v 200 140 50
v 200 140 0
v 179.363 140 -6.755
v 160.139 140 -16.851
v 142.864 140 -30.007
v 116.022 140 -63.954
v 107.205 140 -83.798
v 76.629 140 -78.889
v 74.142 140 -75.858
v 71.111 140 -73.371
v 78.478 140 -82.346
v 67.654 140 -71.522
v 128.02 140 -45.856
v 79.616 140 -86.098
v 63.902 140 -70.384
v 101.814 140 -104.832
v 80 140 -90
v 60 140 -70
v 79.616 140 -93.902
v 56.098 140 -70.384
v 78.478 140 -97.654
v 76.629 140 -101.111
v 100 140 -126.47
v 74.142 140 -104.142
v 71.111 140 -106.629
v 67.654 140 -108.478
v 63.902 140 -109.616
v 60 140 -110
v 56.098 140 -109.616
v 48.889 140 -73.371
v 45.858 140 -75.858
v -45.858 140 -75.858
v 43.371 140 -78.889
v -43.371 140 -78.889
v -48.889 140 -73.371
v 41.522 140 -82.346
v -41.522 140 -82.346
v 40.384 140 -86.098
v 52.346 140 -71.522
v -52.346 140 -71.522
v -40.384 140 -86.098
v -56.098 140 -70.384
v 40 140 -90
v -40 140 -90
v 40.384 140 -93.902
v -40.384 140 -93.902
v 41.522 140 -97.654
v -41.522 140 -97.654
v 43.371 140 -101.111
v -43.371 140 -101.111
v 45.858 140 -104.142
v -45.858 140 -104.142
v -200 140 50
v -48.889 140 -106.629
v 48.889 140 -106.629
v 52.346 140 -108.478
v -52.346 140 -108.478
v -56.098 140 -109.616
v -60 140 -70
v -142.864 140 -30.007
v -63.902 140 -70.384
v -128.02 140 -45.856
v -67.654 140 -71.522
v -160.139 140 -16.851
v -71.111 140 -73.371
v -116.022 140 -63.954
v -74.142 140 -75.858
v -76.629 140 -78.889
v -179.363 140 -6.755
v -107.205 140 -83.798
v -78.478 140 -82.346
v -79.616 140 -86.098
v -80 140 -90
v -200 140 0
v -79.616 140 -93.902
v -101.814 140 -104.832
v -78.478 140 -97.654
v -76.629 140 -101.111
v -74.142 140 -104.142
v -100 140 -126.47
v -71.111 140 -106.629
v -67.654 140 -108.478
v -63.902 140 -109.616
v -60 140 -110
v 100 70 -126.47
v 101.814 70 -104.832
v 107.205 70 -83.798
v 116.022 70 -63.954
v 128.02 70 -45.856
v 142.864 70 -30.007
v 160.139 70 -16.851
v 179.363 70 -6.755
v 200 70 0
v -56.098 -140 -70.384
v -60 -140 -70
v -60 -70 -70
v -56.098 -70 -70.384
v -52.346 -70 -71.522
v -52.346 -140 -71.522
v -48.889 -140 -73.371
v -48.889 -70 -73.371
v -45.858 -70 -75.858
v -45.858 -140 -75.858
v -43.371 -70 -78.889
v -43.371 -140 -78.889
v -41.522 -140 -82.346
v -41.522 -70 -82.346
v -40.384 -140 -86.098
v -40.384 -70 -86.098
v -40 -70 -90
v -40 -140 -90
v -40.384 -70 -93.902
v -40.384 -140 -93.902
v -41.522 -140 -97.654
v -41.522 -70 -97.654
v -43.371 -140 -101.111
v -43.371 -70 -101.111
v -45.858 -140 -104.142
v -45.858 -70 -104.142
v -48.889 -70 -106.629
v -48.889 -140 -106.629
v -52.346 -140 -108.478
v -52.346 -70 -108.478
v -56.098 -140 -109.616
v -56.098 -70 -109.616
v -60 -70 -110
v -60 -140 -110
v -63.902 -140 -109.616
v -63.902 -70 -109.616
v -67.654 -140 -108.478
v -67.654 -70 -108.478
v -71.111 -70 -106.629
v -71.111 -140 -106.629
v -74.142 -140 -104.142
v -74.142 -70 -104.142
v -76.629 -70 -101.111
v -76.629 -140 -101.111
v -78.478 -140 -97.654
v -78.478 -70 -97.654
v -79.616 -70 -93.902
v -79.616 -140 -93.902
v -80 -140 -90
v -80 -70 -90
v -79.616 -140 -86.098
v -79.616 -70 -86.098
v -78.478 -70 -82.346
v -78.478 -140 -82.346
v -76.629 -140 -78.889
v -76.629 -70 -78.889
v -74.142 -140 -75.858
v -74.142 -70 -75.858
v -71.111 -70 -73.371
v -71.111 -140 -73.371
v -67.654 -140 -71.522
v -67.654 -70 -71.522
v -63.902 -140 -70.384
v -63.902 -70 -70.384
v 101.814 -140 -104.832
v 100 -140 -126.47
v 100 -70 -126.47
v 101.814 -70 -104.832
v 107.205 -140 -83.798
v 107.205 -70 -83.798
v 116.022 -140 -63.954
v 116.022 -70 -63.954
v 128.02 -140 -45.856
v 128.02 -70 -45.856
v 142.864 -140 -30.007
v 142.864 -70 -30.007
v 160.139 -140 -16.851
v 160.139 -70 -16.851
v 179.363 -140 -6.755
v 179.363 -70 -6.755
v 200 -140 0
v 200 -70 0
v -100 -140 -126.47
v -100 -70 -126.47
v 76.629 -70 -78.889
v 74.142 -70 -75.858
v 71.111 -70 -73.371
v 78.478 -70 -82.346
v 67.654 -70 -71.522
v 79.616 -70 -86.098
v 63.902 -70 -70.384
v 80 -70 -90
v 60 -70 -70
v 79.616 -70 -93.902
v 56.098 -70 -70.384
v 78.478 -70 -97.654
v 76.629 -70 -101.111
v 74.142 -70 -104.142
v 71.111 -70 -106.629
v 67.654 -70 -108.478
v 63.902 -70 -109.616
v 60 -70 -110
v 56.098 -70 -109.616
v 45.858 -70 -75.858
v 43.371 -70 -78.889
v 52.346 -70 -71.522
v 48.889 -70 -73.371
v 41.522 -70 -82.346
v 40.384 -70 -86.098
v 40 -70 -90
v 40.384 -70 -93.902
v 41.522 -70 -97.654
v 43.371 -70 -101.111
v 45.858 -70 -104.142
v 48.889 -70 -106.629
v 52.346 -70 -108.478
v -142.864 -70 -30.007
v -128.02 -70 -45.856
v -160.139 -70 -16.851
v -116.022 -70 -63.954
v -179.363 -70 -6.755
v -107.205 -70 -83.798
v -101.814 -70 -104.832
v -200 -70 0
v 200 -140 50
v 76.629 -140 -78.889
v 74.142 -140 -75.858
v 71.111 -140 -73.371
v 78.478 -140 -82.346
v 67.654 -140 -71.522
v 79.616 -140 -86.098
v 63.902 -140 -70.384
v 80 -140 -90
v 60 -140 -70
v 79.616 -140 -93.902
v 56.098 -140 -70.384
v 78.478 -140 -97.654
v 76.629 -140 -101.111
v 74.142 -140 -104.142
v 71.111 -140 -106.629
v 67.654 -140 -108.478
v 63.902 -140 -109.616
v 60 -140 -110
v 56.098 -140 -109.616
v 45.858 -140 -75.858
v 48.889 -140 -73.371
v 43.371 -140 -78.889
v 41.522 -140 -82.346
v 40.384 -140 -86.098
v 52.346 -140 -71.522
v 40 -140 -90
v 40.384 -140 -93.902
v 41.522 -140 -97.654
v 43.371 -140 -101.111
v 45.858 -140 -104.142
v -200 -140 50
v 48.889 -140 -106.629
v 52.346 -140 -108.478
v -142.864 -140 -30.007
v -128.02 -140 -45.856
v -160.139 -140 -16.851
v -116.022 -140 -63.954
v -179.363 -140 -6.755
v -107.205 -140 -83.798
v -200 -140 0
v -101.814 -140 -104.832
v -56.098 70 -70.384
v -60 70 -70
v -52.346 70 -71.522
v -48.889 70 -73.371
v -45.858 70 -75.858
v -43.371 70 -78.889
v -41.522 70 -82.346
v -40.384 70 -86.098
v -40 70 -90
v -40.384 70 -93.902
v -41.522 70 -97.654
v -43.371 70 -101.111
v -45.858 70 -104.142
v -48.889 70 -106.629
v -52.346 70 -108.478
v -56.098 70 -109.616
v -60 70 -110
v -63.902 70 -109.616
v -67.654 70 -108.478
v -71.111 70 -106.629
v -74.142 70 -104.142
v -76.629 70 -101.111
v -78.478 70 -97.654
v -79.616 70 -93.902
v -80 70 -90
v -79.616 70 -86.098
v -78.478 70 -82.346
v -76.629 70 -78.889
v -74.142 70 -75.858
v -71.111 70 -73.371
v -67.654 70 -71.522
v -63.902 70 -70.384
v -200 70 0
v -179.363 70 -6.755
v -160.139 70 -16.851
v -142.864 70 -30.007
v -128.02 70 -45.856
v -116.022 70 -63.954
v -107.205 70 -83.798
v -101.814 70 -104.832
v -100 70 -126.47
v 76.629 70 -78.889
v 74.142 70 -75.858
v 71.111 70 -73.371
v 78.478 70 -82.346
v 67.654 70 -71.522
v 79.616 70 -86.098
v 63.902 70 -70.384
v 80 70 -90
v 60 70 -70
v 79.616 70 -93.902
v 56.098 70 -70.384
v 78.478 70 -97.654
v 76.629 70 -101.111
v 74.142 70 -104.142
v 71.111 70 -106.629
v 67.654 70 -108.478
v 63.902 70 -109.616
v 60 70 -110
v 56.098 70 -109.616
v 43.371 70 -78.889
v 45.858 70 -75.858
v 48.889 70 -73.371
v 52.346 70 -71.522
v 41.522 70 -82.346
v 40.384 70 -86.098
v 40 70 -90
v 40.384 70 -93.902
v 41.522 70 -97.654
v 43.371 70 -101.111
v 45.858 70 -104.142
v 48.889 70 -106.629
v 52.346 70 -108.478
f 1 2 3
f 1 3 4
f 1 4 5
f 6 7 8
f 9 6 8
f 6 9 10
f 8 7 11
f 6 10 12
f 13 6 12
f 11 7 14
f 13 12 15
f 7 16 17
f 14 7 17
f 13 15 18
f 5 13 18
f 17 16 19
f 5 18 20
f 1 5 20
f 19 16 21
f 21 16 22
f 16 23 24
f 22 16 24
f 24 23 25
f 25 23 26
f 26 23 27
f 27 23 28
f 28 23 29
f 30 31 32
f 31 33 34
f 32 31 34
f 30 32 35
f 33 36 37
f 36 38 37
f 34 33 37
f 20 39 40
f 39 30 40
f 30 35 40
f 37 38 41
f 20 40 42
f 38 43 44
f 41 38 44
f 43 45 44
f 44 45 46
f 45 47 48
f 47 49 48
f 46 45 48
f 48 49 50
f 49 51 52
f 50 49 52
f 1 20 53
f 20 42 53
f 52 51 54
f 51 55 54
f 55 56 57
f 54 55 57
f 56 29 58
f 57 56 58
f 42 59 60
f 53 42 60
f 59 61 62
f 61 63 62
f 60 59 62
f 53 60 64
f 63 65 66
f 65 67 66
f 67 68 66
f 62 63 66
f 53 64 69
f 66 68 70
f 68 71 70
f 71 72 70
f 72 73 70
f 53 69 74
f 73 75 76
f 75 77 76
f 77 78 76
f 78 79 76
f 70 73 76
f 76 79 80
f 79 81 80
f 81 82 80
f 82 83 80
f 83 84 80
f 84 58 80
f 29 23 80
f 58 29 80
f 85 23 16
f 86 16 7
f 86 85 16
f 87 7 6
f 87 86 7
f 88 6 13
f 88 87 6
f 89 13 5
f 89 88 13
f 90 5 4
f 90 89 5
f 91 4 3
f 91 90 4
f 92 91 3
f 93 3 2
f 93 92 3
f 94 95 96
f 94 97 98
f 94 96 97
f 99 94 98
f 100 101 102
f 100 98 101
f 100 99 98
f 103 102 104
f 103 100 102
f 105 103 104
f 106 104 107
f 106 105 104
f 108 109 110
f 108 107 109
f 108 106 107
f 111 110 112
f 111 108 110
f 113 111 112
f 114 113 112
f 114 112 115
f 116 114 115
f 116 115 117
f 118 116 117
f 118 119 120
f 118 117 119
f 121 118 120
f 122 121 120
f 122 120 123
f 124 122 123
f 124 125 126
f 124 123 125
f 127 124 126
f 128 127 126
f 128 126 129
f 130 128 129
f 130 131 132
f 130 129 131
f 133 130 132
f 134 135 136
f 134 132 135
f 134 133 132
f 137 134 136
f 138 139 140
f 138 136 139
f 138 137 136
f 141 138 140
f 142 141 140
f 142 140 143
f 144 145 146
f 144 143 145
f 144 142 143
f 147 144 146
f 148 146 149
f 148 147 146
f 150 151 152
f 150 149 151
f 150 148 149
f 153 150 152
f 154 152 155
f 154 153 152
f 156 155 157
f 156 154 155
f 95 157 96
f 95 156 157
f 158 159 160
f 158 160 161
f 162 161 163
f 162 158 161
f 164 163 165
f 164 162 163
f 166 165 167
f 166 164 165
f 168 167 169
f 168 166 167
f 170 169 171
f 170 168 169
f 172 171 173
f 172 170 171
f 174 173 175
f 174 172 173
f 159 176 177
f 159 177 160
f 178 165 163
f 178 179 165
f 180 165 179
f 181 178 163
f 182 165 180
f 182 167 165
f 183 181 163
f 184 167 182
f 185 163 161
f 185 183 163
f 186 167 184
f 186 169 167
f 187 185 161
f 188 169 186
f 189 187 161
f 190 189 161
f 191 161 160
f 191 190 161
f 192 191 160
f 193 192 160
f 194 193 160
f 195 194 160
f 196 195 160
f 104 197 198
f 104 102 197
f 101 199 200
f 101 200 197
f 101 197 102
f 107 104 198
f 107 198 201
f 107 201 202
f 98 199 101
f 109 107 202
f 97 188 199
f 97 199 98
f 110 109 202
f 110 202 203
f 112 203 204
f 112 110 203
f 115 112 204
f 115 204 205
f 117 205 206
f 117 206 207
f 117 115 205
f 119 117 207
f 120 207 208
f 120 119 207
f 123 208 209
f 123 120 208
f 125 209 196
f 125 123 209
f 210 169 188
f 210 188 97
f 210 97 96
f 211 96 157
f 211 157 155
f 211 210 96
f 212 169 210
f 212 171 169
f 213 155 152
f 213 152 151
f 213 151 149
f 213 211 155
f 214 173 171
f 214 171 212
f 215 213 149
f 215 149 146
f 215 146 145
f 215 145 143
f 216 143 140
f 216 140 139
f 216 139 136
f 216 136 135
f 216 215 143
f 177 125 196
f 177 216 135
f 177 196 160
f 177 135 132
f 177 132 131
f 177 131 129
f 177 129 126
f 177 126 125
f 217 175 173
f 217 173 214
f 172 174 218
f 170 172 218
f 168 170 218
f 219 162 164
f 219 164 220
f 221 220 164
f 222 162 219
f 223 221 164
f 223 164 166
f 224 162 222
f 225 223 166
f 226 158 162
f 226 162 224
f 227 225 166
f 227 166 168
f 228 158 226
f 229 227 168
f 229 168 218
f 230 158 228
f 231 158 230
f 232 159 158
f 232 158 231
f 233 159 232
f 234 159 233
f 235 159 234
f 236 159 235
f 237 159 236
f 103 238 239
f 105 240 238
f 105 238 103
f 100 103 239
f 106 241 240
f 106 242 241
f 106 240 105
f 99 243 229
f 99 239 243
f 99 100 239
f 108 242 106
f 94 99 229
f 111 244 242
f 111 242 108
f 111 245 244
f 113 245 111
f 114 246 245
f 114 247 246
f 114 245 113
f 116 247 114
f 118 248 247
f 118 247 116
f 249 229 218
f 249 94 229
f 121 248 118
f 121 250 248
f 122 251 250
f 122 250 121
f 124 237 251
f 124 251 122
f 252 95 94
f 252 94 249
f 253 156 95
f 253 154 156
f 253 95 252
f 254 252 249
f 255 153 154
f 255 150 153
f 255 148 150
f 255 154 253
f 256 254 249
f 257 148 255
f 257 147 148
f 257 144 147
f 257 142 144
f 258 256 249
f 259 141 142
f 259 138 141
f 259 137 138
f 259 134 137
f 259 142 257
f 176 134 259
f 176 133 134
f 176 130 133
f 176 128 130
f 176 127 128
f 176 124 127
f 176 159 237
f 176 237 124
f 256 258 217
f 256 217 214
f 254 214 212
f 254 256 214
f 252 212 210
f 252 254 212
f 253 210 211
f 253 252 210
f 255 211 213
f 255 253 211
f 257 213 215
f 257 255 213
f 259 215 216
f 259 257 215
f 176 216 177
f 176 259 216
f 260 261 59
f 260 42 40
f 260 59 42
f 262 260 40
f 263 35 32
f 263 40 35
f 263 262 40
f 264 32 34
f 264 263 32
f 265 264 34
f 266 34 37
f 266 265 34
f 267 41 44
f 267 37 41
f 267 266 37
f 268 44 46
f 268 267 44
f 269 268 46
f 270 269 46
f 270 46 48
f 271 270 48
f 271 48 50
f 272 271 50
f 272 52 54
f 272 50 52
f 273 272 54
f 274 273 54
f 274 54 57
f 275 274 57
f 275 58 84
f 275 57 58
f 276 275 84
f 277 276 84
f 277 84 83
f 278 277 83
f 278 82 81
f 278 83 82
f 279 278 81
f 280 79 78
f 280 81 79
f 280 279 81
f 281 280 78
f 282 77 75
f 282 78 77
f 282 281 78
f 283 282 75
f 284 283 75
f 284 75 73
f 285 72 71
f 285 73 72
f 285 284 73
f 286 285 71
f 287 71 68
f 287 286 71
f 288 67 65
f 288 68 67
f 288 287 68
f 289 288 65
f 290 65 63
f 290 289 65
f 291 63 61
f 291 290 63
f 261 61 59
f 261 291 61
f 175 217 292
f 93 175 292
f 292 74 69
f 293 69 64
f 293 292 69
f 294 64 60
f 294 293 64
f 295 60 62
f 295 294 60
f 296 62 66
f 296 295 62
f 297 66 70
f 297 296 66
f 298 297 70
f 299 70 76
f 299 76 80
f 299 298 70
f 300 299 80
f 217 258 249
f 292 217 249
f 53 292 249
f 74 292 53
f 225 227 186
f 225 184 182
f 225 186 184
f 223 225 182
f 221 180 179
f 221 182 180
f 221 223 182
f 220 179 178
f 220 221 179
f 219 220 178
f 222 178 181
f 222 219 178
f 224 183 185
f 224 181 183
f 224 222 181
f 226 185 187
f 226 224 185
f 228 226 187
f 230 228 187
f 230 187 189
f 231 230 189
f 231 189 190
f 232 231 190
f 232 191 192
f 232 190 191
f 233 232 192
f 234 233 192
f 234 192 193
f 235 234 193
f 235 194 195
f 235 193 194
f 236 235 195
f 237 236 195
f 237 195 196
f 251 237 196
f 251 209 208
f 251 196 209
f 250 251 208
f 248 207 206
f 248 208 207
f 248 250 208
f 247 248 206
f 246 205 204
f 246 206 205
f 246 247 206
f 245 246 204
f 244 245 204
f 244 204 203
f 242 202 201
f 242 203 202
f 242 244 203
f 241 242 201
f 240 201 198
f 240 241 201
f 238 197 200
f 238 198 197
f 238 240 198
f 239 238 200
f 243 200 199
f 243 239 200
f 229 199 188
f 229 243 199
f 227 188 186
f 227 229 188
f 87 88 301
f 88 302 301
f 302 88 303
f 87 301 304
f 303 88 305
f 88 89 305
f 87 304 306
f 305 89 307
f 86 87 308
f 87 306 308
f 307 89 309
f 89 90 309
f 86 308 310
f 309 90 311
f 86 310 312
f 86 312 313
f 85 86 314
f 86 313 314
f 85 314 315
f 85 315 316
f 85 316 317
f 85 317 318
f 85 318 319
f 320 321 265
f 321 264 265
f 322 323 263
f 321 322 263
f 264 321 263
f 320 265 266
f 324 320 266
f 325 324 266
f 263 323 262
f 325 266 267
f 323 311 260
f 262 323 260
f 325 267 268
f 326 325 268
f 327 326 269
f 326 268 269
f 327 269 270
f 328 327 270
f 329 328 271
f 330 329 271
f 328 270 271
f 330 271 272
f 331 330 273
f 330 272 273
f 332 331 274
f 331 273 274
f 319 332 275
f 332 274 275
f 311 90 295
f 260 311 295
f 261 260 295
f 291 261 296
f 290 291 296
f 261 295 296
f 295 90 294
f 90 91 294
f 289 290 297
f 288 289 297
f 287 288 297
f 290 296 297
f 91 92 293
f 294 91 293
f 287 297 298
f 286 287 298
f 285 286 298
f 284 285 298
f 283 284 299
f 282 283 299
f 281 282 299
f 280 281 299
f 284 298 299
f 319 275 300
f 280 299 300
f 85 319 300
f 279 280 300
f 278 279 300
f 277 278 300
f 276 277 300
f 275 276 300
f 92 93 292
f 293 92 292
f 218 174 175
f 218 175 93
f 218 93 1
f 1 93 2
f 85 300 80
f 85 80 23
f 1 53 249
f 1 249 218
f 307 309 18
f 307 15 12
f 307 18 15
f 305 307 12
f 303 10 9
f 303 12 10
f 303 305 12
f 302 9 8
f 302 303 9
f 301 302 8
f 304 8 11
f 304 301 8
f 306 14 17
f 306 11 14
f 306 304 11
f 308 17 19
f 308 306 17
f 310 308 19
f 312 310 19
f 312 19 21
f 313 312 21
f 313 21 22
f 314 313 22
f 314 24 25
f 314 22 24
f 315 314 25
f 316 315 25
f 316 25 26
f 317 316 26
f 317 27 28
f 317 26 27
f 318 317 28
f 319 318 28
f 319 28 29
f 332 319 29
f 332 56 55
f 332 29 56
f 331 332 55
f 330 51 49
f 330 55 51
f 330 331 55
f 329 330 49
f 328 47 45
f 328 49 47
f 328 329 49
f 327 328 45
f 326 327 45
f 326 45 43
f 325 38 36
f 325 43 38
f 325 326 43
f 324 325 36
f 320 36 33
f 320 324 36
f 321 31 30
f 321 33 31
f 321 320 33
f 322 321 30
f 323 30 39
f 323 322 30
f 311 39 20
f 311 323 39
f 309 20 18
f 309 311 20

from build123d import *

# Parameters (mm, degrees)
SKETCH2_W                = 400
SKETCH2_H                = 280
BOSS_EXTRUDE1_DEPTH      = 50
BOSS_EXTRUDE2_DEPTH      = 140
BOSS_EXTRUDE2_DEPTH_BACK = 140
CUT_EXTRUDE1_DEPTH       = 200
CUT_EXTRUDE1_DEPTH_BACK  = 200
SKETCH5_W                = 126.470213754
SKETCH5_H                = 140
CUT_EXTRUDE2_DEPTH       = 200
CUT_EXTRUDE2_DEPTH_BACK  = 200
SKETCH6_R                = 20


with BuildPart() as part:
    # Sketch2 → Boss-Extrude1 (new body)
    with BuildSketch(Plane.XY):
        Rectangle(SKETCH2_W, SKETCH2_H)
    extrude(amount=BOSS_EXTRUDE1_DEPTH)

    # Sketch4 → Boss-Extrude2 (add, two sides: drawn at the far end of the back side and taken through both)
    with BuildSketch(Plane(origin=(0, 0, 0), x_dir=(1, 0, 0), z_dir=(0, 1, 0)).offset(-BOSS_EXTRUDE2_DEPTH_BACK)):
        with BuildLine():
            Line((-100, 126.470213754), (100, 126.470213754))
            ThreePointArc((100, 126.470213754), (128.020392375, 45.855830783), (200, 0))
            Line((200, 0), (100, 0))
            Line((100, 0), (-100, 0))
            Line((-100, 0), (-200, 0))
            ThreePointArc((-200, 0), (-128.020392375, 45.855830783), (-100, 126.470213754))
        make_face()
    extrude(amount=BOSS_EXTRUDE2_DEPTH + BOSS_EXTRUDE2_DEPTH_BACK)

    # Sketch5 → Cut-Extrude1 (cut, two sides: drawn at the far end of the back side and taken through both)
    with BuildSketch(Plane(origin=(0, 0, 0), x_dir=(0, 0, -1), z_dir=(1, 0, 0)).offset(-CUT_EXTRUDE1_DEPTH_BACK)):
        with Locations((63.235106877, 0)):
            Rectangle(SKETCH5_W, SKETCH5_H)
    extrude(amount=CUT_EXTRUDE1_DEPTH + CUT_EXTRUDE1_DEPTH_BACK, mode=Mode.SUBTRACT)

    # Sketch6 → Cut-Extrude2 (cut, two sides: drawn at the far end of the back side and taken through both)
    with BuildSketch(Plane(origin=(0, 0, 0), x_dir=(1, 0, 0), z_dir=(0, 1, 0)).offset(-CUT_EXTRUDE2_DEPTH_BACK)):
        with Locations(Location((-60, 90, 0), (0, 0, 270))):
            Circle(SKETCH6_R)
        with Locations(Location((60, 90, 0), (0, 0, 270))):
            Circle(SKETCH6_R)
    extrude(amount=CUT_EXTRUDE2_DEPTH + CUT_EXTRUDE2_DEPTH_BACK, mode=Mode.SUBTRACT)


solid = part.part
